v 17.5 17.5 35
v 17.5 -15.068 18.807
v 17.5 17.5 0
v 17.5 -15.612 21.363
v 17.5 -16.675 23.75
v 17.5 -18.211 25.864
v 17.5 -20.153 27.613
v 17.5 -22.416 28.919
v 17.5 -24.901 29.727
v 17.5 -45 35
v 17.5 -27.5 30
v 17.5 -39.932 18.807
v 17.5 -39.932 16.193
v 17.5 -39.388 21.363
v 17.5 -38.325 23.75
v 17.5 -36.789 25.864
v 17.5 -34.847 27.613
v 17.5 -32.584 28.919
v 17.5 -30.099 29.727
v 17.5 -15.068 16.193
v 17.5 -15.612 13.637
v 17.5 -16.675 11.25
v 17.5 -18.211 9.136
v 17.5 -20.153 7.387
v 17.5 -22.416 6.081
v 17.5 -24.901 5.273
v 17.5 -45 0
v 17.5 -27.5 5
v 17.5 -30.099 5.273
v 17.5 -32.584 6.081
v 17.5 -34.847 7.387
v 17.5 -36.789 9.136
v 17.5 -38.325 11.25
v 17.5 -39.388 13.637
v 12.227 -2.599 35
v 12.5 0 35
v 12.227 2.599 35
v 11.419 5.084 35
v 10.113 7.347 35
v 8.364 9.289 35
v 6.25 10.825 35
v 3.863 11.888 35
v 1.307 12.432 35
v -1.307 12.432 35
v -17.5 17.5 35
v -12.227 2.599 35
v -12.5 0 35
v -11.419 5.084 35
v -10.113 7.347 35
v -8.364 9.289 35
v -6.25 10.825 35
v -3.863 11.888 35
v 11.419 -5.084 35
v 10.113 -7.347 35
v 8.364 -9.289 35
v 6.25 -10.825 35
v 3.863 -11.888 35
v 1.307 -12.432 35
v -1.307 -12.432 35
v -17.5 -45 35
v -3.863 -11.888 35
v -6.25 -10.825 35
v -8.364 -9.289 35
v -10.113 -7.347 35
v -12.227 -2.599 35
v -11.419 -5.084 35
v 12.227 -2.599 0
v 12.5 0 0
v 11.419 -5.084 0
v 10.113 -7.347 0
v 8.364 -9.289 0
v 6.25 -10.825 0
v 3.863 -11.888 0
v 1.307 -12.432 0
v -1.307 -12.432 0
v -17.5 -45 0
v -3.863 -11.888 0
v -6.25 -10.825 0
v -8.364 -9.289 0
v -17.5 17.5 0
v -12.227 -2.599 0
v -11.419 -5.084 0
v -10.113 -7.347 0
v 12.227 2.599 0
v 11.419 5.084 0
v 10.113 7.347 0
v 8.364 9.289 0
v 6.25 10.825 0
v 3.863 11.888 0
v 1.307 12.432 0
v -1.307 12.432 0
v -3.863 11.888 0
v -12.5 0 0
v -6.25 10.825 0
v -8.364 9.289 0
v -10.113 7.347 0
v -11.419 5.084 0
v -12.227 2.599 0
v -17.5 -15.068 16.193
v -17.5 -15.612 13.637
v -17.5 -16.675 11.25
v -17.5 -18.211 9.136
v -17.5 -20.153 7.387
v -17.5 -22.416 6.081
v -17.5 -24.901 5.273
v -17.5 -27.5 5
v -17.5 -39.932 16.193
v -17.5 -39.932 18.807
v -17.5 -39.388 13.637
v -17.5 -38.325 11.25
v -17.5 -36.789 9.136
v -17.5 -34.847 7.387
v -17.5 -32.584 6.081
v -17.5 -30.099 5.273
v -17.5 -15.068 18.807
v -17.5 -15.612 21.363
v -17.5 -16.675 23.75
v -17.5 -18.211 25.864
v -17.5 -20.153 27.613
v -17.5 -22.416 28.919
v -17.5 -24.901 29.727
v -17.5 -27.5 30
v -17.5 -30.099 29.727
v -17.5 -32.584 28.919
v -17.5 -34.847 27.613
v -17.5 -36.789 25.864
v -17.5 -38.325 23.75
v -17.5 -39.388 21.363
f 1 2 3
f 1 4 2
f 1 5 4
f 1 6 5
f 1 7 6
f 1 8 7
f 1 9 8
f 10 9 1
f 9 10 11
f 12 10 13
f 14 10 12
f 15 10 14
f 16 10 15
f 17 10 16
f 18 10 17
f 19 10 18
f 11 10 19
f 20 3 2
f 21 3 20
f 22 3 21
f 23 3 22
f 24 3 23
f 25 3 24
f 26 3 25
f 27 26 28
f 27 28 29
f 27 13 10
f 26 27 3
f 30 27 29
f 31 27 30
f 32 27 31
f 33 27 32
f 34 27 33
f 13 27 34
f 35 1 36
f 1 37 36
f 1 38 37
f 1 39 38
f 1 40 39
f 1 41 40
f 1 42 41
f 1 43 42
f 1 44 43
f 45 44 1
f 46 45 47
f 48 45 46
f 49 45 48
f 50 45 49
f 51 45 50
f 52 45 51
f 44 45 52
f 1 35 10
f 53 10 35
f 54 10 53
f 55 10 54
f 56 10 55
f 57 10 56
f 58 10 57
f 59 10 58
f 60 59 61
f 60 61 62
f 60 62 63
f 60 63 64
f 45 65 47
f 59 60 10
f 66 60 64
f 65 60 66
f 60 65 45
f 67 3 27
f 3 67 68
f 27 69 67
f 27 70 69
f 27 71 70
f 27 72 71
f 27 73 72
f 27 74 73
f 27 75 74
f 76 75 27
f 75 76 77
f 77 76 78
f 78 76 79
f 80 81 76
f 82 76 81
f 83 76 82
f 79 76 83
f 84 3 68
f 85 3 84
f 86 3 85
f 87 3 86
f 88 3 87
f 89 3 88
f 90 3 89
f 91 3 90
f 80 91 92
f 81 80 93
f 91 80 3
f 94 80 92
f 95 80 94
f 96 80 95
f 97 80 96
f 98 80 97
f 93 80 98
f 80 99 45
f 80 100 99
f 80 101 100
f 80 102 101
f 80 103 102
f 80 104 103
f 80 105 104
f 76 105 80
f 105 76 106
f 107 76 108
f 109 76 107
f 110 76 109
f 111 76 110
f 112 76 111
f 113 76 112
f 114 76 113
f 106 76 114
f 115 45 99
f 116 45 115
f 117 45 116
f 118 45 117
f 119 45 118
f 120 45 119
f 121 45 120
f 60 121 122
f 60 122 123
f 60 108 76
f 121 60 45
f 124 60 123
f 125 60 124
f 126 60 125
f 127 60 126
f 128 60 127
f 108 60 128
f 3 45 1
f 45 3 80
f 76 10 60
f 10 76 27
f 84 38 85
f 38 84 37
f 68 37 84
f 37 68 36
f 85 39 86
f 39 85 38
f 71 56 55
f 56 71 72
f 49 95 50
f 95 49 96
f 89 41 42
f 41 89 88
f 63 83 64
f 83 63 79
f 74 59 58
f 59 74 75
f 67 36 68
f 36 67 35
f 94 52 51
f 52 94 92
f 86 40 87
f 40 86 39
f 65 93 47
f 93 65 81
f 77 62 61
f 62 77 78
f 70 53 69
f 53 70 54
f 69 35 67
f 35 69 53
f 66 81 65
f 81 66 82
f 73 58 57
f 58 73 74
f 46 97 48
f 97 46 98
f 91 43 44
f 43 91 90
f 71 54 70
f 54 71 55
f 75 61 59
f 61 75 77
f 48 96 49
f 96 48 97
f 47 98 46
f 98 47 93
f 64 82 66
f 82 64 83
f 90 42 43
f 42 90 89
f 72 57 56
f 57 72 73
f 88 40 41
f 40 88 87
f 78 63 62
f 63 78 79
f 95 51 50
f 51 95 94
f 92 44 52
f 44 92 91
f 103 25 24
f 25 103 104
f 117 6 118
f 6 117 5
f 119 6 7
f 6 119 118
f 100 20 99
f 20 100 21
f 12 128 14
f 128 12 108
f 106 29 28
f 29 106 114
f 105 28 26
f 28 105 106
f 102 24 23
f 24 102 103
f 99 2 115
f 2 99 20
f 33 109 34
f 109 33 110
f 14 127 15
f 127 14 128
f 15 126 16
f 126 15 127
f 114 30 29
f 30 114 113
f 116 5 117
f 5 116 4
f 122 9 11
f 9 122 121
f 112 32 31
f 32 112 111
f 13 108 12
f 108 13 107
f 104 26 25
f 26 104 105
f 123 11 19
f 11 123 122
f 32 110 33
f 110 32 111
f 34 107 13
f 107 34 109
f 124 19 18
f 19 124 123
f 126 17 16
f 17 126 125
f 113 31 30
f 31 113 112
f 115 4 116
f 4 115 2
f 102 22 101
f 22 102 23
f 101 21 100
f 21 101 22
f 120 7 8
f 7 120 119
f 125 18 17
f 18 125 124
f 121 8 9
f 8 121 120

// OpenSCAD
width=35;
depth=62.5;
height=35;
diameter=25;
okraj=(width-diameter)/2;
mezera=depth-2*okraj-2*diameter;
difference(){
translate([-(diameter/2+okraj),-(depth-diameter/2-okraj),0])
cube([width,depth,height]);
    cylinder(h=height,r1=diameter/2,r2=diameter/2);
    translate([-(diameter/2+okraj),-(diameter+mezera),diameter/2+okraj])
    rotate([0,90,0])
    cylinder(h=height,r1=diameter/2,r2=diameter/2);  
       }
